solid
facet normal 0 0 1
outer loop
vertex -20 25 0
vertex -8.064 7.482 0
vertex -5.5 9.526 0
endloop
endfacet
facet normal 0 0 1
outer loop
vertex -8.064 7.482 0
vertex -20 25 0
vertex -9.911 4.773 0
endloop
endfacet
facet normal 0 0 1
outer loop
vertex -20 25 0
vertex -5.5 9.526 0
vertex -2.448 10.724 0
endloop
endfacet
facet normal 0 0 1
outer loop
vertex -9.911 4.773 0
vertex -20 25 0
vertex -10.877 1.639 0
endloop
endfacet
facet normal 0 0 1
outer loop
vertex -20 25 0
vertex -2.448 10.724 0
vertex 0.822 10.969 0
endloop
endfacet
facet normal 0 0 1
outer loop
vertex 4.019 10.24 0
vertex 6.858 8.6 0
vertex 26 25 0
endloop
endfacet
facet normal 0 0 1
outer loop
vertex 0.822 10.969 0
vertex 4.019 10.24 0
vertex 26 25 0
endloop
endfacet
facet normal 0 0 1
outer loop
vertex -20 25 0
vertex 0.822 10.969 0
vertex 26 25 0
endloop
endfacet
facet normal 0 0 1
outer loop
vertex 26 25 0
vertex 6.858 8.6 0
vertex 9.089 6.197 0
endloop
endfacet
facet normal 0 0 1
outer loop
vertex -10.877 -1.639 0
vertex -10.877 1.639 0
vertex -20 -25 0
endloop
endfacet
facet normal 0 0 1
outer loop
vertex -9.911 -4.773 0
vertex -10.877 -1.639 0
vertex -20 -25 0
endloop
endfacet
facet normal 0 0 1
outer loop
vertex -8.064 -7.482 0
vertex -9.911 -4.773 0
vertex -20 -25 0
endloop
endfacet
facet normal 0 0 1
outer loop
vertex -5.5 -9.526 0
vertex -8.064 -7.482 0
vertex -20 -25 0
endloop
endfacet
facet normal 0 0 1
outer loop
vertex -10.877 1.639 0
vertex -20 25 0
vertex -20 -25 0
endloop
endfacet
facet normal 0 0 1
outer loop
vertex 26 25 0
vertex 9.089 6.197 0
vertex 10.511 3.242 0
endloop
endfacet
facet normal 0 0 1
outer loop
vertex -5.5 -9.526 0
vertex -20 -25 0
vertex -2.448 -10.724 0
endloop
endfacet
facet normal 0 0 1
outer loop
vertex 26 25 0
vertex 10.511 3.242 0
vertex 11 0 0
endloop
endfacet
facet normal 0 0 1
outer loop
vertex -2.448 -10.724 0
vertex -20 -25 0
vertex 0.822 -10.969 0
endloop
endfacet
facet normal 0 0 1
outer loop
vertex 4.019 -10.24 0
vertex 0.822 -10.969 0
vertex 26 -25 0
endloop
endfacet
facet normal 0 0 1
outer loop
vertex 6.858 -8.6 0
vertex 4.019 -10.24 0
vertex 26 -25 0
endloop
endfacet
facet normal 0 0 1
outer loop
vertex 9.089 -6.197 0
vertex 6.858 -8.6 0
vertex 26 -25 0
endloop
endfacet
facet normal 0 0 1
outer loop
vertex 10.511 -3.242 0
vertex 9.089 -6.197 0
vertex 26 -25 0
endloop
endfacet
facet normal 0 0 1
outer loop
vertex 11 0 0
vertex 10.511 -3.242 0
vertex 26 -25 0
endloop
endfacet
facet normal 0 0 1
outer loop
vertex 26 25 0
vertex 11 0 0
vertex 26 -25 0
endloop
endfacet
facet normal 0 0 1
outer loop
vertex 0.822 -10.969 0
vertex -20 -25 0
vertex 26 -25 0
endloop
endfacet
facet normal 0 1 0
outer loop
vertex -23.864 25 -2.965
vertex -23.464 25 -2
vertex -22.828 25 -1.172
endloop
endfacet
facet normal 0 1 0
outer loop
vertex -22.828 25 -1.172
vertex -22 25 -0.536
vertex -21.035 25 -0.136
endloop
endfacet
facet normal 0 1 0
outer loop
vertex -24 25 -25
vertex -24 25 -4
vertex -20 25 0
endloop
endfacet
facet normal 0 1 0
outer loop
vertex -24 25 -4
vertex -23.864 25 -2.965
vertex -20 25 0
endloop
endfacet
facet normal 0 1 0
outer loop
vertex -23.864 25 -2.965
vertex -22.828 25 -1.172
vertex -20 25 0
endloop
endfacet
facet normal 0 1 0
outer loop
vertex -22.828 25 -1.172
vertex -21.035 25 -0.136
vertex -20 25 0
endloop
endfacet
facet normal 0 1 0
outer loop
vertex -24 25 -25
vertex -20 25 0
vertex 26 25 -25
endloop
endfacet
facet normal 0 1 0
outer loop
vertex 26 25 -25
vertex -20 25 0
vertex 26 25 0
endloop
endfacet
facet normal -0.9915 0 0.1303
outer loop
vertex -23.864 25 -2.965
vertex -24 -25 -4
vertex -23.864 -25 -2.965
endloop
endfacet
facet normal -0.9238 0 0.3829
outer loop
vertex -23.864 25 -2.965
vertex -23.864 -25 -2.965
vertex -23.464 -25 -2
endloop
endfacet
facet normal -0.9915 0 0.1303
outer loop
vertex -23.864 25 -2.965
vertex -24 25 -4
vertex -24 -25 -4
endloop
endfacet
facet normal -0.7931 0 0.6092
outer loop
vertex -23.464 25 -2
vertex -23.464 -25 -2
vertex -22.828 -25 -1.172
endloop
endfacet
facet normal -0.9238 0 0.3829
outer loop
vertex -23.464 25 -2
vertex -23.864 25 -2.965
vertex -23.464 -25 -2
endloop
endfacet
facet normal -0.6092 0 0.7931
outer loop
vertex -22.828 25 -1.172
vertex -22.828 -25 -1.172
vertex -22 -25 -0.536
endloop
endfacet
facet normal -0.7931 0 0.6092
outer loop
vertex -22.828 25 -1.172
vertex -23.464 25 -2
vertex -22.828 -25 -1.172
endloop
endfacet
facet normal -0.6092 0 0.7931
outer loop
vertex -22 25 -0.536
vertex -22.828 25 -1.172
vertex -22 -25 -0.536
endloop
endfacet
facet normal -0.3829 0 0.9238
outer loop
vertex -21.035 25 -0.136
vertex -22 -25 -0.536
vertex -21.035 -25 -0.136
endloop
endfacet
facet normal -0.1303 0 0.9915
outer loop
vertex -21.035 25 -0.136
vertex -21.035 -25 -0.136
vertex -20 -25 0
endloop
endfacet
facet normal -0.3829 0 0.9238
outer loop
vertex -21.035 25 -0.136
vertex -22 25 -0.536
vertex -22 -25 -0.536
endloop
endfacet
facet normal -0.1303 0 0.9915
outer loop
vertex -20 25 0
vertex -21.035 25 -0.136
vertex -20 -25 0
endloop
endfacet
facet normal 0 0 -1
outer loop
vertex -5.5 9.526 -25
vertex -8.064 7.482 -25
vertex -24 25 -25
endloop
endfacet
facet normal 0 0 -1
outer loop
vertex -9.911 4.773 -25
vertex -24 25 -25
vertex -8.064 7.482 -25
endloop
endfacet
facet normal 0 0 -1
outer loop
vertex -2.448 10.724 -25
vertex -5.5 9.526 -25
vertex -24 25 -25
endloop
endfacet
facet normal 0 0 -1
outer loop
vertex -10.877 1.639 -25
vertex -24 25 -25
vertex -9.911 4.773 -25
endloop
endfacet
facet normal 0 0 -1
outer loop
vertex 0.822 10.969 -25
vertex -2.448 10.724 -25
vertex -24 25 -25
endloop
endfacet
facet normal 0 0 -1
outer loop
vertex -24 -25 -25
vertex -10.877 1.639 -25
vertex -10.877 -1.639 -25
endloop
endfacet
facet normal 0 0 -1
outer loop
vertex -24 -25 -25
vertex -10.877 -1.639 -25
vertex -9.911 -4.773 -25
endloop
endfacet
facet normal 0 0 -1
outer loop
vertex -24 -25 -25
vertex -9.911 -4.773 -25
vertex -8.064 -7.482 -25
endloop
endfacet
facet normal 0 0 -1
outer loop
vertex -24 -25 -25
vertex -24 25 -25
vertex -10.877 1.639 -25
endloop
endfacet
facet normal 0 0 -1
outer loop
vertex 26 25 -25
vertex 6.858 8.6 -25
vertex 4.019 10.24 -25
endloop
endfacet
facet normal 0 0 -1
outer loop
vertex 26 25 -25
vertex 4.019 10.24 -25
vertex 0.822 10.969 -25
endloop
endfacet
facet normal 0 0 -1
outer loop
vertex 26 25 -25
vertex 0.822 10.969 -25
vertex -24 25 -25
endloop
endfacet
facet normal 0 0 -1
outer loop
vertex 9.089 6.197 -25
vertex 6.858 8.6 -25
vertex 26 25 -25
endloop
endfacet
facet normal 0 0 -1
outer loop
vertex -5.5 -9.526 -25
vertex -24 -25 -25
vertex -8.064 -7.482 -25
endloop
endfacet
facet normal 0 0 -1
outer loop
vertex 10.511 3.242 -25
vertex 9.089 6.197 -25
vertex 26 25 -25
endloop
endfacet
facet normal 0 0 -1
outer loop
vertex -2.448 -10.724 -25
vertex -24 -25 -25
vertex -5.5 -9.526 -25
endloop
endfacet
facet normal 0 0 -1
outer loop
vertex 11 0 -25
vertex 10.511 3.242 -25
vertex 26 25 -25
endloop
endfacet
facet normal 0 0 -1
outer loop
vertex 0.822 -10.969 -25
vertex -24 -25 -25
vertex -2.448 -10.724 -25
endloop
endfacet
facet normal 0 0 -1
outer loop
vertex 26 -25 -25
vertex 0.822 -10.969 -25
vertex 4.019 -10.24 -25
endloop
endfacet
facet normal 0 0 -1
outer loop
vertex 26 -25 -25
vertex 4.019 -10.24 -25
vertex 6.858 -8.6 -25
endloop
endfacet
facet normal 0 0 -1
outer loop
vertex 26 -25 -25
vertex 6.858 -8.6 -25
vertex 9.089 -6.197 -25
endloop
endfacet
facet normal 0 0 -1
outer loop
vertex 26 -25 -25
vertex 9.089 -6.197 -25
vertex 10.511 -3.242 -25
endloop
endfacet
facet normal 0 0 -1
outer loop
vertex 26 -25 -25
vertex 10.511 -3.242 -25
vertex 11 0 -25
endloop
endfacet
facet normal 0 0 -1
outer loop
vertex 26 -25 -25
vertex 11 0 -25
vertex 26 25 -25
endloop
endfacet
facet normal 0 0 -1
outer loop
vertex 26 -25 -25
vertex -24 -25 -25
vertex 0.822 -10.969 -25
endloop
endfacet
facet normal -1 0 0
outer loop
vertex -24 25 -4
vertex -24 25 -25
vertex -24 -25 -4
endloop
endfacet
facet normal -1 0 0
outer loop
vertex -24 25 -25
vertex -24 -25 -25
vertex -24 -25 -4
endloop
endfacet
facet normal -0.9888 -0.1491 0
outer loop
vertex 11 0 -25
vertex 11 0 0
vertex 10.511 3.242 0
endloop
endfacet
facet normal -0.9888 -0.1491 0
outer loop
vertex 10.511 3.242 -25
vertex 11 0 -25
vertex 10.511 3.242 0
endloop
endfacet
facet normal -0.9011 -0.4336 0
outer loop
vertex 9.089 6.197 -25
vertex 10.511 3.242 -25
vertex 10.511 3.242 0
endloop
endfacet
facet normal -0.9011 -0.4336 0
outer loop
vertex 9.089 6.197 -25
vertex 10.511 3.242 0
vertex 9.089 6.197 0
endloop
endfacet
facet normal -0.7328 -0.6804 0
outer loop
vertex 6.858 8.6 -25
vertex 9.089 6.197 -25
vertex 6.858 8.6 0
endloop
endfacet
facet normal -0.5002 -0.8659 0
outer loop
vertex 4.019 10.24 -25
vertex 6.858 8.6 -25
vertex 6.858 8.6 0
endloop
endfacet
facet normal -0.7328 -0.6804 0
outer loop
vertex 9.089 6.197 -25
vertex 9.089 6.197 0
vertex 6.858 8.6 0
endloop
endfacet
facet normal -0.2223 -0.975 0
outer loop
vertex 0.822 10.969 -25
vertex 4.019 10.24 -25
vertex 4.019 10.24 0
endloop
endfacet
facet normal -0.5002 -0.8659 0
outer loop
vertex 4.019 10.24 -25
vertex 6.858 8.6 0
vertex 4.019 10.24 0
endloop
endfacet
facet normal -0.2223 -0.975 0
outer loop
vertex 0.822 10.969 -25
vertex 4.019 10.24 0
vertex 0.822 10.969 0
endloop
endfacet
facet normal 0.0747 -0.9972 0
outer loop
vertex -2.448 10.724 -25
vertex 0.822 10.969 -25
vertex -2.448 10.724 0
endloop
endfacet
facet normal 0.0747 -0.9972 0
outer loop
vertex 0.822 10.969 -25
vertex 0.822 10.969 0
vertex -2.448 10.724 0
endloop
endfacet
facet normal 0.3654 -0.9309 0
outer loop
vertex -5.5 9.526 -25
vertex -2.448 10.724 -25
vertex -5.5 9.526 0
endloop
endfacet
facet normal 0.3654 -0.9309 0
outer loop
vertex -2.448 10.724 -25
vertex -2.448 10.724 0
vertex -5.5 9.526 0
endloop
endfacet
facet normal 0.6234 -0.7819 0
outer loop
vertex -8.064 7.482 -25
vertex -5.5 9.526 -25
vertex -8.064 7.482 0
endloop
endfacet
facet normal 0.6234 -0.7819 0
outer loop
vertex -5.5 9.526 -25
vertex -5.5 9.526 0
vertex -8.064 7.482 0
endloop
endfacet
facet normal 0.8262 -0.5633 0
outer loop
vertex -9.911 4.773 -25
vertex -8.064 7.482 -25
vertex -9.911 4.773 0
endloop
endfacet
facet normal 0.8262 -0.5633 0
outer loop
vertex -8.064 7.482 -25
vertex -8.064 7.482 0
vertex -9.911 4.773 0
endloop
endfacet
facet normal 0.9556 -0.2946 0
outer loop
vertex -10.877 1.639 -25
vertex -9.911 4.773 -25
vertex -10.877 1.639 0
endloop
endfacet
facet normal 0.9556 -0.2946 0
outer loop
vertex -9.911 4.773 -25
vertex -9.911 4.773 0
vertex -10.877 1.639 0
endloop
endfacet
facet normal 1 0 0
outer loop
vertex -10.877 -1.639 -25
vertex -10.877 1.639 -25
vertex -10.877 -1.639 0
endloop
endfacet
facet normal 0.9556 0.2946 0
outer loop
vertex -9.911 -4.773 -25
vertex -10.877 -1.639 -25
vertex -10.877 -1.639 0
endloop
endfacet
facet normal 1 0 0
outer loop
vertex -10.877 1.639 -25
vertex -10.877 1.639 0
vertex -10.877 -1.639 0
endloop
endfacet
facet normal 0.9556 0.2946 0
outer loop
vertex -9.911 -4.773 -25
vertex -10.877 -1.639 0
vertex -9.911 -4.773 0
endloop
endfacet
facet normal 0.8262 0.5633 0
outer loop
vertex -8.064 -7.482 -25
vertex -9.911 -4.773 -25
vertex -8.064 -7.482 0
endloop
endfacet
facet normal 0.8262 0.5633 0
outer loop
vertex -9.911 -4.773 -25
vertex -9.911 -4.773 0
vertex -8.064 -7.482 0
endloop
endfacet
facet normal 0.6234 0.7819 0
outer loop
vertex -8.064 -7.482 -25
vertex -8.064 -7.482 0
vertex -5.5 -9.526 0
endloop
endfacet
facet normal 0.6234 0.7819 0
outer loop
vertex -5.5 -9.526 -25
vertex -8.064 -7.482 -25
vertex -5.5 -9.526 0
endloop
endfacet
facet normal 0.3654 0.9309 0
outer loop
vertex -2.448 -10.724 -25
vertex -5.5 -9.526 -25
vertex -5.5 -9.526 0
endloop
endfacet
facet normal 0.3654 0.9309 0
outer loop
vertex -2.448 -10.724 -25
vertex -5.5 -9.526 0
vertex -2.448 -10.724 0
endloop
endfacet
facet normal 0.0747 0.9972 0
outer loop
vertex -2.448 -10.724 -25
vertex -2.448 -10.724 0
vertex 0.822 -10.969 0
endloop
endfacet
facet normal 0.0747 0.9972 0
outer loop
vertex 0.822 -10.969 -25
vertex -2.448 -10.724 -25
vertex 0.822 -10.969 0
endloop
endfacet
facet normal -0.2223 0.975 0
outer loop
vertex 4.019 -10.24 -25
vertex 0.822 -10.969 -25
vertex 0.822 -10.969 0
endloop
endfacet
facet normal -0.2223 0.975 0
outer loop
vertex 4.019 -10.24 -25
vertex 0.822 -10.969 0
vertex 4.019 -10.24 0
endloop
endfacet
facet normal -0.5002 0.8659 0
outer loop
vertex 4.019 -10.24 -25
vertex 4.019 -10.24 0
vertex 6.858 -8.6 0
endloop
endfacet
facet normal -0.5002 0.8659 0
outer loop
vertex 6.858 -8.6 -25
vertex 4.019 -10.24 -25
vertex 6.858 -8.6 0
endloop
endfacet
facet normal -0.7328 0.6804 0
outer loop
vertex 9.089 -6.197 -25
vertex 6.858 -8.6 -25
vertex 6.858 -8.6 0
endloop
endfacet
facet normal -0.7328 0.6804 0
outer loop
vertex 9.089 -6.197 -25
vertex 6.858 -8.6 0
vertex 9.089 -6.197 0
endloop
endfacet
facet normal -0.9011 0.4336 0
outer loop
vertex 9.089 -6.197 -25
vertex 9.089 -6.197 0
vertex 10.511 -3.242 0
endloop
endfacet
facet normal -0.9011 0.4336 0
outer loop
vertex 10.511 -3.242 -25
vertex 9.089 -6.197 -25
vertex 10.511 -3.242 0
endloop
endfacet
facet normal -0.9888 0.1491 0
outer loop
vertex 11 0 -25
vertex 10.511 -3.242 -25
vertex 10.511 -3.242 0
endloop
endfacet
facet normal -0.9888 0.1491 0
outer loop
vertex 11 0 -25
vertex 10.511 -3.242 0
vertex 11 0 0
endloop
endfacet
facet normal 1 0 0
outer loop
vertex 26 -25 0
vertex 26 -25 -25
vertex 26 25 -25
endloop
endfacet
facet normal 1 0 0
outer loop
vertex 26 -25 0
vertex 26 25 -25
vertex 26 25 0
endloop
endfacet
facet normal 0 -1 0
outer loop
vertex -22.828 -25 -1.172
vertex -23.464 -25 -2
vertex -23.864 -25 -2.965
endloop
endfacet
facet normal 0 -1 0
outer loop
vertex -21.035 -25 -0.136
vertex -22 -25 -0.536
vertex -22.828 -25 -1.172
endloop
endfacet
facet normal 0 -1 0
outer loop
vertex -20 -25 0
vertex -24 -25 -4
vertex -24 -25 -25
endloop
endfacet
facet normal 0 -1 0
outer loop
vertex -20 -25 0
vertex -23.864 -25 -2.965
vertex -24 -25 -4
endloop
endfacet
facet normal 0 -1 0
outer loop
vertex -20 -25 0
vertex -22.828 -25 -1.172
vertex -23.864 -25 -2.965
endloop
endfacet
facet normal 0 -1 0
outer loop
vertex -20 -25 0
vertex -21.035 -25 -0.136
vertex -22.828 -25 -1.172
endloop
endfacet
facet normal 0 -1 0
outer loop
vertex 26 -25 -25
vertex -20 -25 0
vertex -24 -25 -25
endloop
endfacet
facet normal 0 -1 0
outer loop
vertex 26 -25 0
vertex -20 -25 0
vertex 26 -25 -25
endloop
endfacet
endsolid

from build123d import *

# Parameters (mm, degrees)
F0_W     = 50
F0_H     = 25
F1_DEPTH = 25
F2_R     = 4
F3_R     = 11
F4_DEPTH = 25.001


with BuildPart() as f1:
    # F0 (on Front) → F1 (new body, symmetric)
    with BuildSketch(Plane.XZ):
        with Locations((1, -12.5)):
            Rectangle(F0_W, F0_H)
    extrude(amount=F1_DEPTH, both=True)

    # F2
    f2_edges = [f1.edges().sort_by_distance(p)[0] for p in [
        (-24, 0, 0),
    ]]
    fillet(f2_edges, radius=F2_R)

    # F3 (on face) → F4 (cut, through all)
    with BuildSketch(Plane.XY):
        Circle(F3_R)
    extrude(amount=-F4_DEPTH, mode=Mode.SUBTRACT)


solid = f1.part
